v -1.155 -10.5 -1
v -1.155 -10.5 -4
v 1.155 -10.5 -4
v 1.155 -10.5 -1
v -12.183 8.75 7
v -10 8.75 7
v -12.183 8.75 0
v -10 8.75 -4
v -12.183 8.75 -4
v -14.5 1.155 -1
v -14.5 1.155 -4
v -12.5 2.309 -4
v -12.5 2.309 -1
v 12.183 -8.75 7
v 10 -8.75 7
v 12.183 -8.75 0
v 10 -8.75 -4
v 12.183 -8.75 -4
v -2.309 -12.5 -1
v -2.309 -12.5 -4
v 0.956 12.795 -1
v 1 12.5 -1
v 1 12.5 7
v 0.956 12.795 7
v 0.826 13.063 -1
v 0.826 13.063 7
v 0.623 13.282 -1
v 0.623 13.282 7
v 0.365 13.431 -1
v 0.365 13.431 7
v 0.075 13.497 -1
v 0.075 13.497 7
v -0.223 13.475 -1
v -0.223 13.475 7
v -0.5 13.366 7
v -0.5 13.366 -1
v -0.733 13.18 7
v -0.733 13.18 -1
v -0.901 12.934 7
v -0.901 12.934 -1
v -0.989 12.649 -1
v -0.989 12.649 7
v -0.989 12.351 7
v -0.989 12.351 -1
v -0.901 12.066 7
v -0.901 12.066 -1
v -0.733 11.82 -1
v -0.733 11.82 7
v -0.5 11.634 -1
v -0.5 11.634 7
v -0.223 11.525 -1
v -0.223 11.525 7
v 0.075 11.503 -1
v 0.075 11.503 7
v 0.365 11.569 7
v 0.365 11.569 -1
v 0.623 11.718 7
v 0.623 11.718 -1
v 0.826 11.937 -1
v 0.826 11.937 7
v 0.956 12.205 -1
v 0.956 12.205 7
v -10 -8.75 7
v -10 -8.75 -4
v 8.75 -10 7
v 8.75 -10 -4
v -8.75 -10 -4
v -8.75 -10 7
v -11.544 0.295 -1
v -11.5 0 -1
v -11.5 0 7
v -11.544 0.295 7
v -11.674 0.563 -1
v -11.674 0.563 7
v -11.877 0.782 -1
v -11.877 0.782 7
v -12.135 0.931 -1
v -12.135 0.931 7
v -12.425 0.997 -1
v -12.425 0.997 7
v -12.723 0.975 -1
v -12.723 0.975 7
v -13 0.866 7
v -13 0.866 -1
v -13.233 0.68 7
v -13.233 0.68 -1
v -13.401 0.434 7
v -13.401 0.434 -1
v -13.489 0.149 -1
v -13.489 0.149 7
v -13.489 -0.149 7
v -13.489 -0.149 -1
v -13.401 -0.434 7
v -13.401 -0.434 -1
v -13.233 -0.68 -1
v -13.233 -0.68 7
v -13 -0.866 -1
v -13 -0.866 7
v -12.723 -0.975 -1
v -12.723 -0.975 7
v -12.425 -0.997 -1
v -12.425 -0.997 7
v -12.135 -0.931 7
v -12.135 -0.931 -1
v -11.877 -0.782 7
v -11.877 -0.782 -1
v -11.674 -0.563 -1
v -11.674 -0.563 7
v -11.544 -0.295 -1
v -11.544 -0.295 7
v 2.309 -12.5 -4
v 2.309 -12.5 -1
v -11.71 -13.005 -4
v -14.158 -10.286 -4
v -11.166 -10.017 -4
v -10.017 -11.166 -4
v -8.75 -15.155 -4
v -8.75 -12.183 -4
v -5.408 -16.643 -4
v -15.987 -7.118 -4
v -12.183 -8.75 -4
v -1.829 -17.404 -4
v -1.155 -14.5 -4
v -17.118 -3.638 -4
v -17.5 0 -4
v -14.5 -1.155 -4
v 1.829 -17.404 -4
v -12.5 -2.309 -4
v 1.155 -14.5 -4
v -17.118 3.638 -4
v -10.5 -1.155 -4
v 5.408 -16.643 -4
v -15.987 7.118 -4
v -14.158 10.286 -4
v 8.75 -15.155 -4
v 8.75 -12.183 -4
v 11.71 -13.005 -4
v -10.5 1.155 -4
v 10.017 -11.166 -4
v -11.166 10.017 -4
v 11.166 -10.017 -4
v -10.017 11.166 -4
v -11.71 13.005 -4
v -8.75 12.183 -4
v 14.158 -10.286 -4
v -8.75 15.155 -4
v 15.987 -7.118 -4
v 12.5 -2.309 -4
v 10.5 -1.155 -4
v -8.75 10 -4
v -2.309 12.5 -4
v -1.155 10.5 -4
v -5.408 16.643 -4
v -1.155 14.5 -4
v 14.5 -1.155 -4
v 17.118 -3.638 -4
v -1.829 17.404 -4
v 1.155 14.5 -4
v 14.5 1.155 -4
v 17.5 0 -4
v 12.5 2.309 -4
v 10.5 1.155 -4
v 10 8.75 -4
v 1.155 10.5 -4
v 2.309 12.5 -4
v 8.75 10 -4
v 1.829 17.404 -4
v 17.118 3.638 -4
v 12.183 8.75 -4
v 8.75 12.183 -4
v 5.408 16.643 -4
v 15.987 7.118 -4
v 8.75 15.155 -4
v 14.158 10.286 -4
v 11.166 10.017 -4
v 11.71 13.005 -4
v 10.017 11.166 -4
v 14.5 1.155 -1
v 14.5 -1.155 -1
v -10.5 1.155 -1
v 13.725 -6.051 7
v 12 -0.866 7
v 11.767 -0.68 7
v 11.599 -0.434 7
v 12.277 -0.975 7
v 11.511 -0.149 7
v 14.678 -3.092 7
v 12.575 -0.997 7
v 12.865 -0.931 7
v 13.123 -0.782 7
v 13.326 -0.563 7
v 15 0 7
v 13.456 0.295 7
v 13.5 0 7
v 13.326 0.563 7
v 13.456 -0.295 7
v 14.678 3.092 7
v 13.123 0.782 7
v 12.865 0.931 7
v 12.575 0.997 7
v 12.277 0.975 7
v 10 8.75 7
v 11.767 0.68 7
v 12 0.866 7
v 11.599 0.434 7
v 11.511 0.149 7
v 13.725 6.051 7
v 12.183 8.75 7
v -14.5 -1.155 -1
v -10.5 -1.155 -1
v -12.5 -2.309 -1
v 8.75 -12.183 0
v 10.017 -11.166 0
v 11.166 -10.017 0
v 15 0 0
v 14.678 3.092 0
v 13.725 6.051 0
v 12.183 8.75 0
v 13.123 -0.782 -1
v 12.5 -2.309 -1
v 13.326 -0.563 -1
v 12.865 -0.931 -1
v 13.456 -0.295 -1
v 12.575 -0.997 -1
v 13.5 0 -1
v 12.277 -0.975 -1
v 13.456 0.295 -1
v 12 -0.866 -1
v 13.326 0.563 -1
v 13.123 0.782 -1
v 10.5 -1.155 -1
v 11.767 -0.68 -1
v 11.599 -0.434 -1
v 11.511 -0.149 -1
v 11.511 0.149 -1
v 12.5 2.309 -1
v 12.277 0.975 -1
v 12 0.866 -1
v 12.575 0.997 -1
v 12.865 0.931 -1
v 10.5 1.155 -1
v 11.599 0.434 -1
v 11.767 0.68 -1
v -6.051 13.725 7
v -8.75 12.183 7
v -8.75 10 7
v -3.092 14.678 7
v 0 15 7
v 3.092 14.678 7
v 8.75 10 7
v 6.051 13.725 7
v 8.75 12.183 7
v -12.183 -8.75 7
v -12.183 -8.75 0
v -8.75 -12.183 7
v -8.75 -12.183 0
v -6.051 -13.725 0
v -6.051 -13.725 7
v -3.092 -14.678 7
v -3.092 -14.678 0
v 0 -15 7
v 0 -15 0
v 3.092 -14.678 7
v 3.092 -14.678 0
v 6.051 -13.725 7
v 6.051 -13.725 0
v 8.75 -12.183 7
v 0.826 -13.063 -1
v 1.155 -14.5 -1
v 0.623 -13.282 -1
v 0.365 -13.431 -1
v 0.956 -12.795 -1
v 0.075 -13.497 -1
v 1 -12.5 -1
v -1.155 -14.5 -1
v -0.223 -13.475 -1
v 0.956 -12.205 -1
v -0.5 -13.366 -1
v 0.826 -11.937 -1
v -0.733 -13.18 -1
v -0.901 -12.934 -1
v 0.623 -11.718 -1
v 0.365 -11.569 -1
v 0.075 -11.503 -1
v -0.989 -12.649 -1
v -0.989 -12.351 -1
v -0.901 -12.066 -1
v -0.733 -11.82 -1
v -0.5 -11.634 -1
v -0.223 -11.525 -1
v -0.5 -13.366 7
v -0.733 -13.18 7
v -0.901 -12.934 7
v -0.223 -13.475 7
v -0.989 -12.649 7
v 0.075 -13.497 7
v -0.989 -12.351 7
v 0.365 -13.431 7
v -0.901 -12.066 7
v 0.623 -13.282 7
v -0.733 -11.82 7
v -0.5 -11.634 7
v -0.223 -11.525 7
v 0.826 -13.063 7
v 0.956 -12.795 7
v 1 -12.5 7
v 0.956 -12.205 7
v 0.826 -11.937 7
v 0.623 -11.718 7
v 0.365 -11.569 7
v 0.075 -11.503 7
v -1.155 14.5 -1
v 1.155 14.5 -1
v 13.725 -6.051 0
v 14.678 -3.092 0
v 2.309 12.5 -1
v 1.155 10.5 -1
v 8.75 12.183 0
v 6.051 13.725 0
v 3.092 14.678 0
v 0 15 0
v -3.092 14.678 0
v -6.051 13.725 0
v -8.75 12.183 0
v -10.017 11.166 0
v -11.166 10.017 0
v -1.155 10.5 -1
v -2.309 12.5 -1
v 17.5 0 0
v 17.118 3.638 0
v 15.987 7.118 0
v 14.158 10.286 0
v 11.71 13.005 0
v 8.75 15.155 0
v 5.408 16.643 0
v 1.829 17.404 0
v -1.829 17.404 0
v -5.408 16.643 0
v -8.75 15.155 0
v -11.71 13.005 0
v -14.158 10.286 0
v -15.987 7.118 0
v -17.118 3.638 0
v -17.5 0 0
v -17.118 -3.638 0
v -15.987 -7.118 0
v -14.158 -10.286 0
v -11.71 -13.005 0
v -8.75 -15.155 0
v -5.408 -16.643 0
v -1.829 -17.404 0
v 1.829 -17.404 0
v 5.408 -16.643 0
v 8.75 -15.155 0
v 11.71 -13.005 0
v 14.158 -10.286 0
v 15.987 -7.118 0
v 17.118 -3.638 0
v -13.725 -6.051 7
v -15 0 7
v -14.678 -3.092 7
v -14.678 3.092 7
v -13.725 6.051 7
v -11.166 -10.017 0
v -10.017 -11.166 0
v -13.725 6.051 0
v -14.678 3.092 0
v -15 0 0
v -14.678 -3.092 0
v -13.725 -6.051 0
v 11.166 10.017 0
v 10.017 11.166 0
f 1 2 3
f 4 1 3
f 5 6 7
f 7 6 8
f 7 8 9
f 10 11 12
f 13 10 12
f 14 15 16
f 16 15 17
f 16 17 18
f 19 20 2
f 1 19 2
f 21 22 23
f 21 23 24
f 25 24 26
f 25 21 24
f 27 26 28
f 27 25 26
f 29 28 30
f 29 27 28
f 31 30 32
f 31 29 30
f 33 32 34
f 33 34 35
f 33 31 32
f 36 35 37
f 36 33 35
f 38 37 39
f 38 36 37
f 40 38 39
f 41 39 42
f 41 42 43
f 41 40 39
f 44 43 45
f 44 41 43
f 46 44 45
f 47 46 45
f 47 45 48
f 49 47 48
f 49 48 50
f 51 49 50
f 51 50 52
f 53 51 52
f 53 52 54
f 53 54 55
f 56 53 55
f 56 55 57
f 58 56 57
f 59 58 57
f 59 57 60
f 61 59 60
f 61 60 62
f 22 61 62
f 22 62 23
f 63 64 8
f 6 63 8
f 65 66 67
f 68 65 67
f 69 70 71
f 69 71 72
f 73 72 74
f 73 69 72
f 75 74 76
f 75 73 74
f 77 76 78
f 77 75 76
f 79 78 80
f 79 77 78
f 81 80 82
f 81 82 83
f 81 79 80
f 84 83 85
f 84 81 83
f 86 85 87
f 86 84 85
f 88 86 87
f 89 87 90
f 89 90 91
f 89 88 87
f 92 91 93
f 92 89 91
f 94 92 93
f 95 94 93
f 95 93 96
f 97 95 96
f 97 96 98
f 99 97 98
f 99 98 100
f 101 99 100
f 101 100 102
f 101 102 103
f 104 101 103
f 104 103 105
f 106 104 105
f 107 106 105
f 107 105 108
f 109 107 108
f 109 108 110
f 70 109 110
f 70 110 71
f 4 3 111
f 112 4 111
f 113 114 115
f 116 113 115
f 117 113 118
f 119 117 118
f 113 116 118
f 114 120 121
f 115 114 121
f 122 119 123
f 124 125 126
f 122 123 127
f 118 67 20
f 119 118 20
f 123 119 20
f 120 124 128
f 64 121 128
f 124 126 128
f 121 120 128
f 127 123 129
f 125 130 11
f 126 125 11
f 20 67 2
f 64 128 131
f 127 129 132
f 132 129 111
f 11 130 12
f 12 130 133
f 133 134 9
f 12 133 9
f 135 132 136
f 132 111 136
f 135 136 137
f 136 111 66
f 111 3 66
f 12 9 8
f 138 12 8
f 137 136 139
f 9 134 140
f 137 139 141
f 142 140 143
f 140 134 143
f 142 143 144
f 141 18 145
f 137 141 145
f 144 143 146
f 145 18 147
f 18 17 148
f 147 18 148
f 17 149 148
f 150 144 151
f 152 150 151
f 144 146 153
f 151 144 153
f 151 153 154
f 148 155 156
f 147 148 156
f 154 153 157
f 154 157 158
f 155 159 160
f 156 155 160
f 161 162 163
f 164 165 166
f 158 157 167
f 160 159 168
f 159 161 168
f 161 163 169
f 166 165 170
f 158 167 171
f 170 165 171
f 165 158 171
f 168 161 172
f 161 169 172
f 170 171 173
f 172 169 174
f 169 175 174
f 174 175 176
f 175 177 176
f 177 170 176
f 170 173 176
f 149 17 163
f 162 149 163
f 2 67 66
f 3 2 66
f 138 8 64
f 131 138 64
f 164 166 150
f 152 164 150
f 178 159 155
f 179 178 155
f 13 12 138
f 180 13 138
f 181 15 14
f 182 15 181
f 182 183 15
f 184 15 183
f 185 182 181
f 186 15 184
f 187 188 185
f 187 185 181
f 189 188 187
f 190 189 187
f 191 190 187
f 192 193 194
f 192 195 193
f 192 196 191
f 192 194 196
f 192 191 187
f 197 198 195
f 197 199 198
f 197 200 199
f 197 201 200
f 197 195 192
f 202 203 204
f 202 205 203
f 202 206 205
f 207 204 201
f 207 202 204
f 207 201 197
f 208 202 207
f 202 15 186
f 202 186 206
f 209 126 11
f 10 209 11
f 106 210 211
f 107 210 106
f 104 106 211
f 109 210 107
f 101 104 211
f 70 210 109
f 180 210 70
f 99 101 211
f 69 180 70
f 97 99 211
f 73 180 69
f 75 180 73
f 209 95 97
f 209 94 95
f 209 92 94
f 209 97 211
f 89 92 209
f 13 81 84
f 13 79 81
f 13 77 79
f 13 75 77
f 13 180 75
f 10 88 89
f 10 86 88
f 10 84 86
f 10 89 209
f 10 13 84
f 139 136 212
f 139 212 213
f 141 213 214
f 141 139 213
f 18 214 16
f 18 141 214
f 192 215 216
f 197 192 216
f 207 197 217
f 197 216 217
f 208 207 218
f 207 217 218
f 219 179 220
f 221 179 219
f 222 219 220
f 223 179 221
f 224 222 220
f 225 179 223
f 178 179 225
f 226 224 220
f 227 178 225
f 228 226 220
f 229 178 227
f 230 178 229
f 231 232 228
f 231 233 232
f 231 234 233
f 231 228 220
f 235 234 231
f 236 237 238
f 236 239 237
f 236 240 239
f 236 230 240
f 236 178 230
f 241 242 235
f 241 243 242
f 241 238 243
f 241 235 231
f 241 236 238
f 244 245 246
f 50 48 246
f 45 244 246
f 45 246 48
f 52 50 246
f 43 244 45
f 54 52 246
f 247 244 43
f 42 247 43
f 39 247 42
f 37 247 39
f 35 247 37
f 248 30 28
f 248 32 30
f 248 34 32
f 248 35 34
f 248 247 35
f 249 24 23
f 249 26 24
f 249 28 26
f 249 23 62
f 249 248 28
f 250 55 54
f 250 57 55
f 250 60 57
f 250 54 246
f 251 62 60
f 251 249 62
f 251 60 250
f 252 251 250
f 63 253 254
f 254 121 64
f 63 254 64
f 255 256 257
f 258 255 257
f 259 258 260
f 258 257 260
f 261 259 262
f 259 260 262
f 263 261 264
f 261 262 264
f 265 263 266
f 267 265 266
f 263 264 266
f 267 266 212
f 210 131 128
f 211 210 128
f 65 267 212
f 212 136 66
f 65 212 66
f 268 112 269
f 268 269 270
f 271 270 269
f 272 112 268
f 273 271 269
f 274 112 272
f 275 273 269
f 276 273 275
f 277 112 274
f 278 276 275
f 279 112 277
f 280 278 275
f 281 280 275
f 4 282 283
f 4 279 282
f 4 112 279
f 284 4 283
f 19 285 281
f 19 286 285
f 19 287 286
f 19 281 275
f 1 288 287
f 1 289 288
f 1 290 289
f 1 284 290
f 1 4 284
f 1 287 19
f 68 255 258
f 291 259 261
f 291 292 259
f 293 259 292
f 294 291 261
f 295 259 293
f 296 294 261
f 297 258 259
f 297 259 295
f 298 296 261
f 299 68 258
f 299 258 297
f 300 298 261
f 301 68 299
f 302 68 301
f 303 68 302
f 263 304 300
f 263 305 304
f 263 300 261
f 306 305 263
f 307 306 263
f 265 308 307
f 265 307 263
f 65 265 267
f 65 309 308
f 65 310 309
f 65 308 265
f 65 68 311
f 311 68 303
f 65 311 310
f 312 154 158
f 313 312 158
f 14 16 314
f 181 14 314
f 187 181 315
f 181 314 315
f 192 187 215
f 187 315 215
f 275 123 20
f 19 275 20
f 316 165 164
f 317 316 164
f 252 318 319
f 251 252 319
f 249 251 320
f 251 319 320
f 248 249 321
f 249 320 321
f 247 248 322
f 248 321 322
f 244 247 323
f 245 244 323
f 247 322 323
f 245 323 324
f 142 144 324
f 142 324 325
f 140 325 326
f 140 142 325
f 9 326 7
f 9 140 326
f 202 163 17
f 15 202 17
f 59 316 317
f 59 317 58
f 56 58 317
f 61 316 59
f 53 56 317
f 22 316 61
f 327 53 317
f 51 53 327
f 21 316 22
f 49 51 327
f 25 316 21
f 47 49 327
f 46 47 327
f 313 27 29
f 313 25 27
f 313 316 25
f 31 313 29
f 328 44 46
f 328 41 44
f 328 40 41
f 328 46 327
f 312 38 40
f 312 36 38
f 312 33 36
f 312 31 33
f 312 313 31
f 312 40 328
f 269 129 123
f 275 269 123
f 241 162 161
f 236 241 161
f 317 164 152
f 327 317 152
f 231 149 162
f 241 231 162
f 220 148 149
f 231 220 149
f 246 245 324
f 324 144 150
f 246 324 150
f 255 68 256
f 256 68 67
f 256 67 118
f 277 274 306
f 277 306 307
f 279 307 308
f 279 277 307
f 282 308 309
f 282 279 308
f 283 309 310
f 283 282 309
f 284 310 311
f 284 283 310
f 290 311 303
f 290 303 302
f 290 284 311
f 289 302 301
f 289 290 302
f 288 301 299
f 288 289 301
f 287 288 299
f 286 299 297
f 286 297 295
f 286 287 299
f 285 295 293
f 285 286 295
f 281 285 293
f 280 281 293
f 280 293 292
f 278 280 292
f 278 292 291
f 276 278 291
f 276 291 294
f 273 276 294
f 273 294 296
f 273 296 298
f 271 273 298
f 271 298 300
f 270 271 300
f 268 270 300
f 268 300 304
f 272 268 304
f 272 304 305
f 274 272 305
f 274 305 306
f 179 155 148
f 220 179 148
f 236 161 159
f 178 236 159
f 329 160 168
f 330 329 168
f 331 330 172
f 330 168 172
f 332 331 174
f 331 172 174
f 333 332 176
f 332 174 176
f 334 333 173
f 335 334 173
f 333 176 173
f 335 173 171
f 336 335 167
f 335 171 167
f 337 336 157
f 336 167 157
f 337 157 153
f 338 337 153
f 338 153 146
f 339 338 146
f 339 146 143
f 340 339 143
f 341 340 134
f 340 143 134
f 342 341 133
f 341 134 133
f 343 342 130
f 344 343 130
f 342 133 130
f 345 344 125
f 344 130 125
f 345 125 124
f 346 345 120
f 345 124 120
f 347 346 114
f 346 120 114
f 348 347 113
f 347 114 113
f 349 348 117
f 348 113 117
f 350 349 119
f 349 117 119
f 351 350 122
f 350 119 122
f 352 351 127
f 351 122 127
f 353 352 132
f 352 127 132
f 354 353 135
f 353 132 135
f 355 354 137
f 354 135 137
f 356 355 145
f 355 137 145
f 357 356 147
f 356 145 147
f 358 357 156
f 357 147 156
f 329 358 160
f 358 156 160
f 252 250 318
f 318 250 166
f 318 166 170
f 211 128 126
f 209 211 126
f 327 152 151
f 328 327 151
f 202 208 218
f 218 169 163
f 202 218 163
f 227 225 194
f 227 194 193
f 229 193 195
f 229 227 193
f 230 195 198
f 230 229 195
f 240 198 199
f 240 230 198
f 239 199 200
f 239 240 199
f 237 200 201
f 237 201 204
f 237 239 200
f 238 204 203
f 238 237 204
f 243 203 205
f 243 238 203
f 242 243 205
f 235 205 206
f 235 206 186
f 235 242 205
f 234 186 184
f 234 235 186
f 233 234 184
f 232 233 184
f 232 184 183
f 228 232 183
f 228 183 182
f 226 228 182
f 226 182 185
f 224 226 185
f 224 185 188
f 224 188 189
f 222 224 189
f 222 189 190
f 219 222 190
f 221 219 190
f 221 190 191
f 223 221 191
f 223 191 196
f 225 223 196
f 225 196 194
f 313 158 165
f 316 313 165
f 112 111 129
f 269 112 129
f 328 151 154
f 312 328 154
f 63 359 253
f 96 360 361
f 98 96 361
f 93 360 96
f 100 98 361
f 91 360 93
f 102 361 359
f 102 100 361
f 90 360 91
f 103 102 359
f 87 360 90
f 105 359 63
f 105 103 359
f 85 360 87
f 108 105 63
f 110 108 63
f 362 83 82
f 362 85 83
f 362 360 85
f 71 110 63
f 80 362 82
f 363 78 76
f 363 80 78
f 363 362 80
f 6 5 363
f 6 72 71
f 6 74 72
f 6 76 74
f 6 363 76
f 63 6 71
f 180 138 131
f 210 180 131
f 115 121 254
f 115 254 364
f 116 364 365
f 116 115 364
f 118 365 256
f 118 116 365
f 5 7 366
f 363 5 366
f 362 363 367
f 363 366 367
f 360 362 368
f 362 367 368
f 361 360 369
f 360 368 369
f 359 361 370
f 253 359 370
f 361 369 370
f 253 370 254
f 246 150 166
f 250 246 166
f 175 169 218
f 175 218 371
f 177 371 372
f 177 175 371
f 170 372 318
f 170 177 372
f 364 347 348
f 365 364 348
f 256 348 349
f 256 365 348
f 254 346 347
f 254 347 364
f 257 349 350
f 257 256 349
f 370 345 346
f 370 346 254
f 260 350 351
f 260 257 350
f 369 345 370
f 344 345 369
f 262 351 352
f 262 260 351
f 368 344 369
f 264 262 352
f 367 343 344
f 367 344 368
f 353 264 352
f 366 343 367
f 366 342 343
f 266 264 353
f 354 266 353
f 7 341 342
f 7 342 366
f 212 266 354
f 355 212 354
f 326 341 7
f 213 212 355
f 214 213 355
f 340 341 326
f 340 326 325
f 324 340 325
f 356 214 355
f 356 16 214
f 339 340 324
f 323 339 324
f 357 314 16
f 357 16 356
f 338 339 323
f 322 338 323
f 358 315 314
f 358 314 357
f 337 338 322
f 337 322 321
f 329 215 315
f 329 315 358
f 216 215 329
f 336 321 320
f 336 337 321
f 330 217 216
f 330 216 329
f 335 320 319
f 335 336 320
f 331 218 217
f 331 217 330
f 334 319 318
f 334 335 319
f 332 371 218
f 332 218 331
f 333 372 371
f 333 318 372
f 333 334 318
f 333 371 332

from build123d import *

# Parameters (mm, degrees)
SKETCH_1_R          = 1
EXTRUDE_1_DEPTH     = 7
EXTRUDE_1_2_DEPTH   = 7
EXTRUDE_1_3_DEPTH   = 7
EXTRUDE_1_4_DEPTH   = 7
EXTRUDE_START       = -4
SKETCH_1_3_R        = 17.5
SKETCH_1_3_R_2      = 1
EXTRUDE_2_DEPTH     = 4
CUT_EXTRUDE_1_DEPTH = 3


with BuildPart() as part:
    # 草图1 → 凸台-拉伸1 (new body)
    with BuildSketch(Plane.XY):
        with BuildLine():
            Line((-8.75, 12.183492931), (-8.75, 10))
            Line((-8.75, 10), (8.75, 10))
            Line((8.75, 10), (8.75, 12.183492931))
            ThreePointArc((8.75, 12.183492931), (0, 15), (-8.75, 12.183492931))
        make_face()
        with Locations((0, 12.5)):
            Circle(SKETCH_1_R, mode=Mode.SUBTRACT)
    extrude(amount=EXTRUDE_1_DEPTH)



with BuildPart() as body_2:
    # 草图1 → Extrude 1 2 (new body)
    with BuildSketch(Plane.XY):
        with BuildLine():
            Line((-10, 8.75), (-12.183492931, 8.75))
            ThreePointArc((-12.183492931, 8.75), (-15, 0), (-12.183492931, -8.75))
            Line((-12.183492931, -8.75), (-10, -8.75))
            Line((-10, -8.75), (-10, 8.75))
        make_face()
        with Locations((-12.5, 0)):
            Circle(SKETCH_1_R, mode=Mode.SUBTRACT)
    extrude(amount=EXTRUDE_1_2_DEPTH)


with BuildPart() as body_3:
    # 草图1 → Extrude 1 3 (new body)
    with BuildSketch(Plane.XY):
        with BuildLine():
            ThreePointArc((12.183492931, -8.75), (15, 0), (12.183492931, 8.75))
            Line((12.183492931, 8.75), (10, 8.75))
            Line((10, 8.75), (10, -8.75))
            Line((10, -8.75), (12.183492931, -8.75))
        make_face()
        with Locations((12.5, 0)):
            Circle(SKETCH_1_R, mode=Mode.SUBTRACT)
    extrude(amount=EXTRUDE_1_3_DEPTH)


with BuildPart() as body_4:
    # 草图1 → Extrude 1 4 (new body)
    with BuildSketch(Plane.XY):
        with BuildLine():
            Line((-8.75, -10), (-8.75, -12.183492931))
            ThreePointArc((-8.75, -12.183492931), (0, -15), (8.75, -12.183492931))
            Line((8.75, -12.183492931), (8.75, -10))
            Line((8.75, -10), (-8.75, -10))
        make_face()
        with Locations((0, -12.5)):
            Circle(SKETCH_1_R, mode=Mode.SUBTRACT)
    extrude(amount=EXTRUDE_1_4_DEPTH)


with BuildPart() as part_1:
    add(part.part)

    add(body_2.part)  # 凸台-拉伸2 merges body 2

    add(body_3.part)  # 凸台-拉伸2 merges body 3

    add(body_4.part)  # 凸台-拉伸2 merges body 4
    # 草图1<3> → 凸台-拉伸2 (add)
    with BuildSketch(Plane.XY.offset(EXTRUDE_START)):
        Circle(SKETCH_1_3_R)
        with BuildLine():
            Line((-8.75, 12.183492931), (-8.75, 10))
            Line((-8.75, 10), (8.75, 10))
            Line((8.75, 10), (8.75, 12.183492931))
            ThreePointArc((8.75, 12.183492931), (10.606601718, 10.606601718), (12.183492931, 8.75))
            Line((12.183492931, 8.75), (10, 8.75))
            Line((10, 8.75), (10, -8.75))
            Line((10, -8.75), (12.183492931, -8.75))
            ThreePointArc((12.183492931, -8.75), (10.606601718, -10.606601718), (8.75, -12.183492931))
            Line((8.75, -12.183492931), (8.75, -10))
            Line((8.75, -10), (-8.75, -10))
            Line((-8.75, -10), (-8.75, -12.183492931))
            ThreePointArc((-8.75, -12.183492931), (-10.606601718, -10.606601718), (-12.183492931, -8.75))
            Line((-12.183492931, -8.75), (-10, -8.75))
            Line((-10, -8.75), (-10, 8.75))
            Line((-10, 8.75), (-12.183492931, 8.75))
            ThreePointArc((-12.183492931, 8.75), (-10.606601718, 10.606601718), (-8.75, 12.183492931))
        make_face(mode=Mode.SUBTRACT)
        with Locations((0, 12.5)):
            Circle(SKETCH_1_3_R_2, mode=Mode.SUBTRACT)
        with Locations((-12.5, 0)):
            Circle(SKETCH_1_3_R_2, mode=Mode.SUBTRACT)
        with Locations((0, -12.5)):
            Circle(SKETCH_1_3_R_2, mode=Mode.SUBTRACT)
        with Locations((12.5, 0)):
            Circle(SKETCH_1_3_R_2, mode=Mode.SUBTRACT)
    extrude(amount=EXTRUDE_2_DEPTH)

    # 草图2 → 切除-拉伸1 (cut)
    with BuildSketch(Plane(origin=(0, 0, -4), x_dir=(-1, 0, 0), z_dir=(0, 0, -1))):
        Polygon((10.5, -1.154700538), (12.5, -2.309401077), (14.5, -1.154700538), (14.5, 1.154700538), (12.5, 2.309401077), (10.5, 1.154700538), align=None)
        Polygon((1.154700538, 10.5), (2.309401077, 12.5), (1.154700538, 14.5), (-1.154700538, 14.5), (-2.309401077, 12.5), (-1.154700538, 10.5), align=None)
        Polygon((-1.154700538, -10.5), (-2.309401077, -12.5), (-1.154700538, -14.5), (1.154700538, -14.5), (2.309401077, -12.5), (1.154700538, -10.5), align=None)
        Polygon((-10.5, 1.154700538), (-12.5, 2.309401077), (-14.5, 1.154700538), (-14.5, -1.154700538), (-12.5, -2.309401077), (-10.5, -1.154700538), align=None)
    extrude(amount=-CUT_EXTRUDE_1_DEPTH, mode=Mode.SUBTRACT)


solid = part_1.part
